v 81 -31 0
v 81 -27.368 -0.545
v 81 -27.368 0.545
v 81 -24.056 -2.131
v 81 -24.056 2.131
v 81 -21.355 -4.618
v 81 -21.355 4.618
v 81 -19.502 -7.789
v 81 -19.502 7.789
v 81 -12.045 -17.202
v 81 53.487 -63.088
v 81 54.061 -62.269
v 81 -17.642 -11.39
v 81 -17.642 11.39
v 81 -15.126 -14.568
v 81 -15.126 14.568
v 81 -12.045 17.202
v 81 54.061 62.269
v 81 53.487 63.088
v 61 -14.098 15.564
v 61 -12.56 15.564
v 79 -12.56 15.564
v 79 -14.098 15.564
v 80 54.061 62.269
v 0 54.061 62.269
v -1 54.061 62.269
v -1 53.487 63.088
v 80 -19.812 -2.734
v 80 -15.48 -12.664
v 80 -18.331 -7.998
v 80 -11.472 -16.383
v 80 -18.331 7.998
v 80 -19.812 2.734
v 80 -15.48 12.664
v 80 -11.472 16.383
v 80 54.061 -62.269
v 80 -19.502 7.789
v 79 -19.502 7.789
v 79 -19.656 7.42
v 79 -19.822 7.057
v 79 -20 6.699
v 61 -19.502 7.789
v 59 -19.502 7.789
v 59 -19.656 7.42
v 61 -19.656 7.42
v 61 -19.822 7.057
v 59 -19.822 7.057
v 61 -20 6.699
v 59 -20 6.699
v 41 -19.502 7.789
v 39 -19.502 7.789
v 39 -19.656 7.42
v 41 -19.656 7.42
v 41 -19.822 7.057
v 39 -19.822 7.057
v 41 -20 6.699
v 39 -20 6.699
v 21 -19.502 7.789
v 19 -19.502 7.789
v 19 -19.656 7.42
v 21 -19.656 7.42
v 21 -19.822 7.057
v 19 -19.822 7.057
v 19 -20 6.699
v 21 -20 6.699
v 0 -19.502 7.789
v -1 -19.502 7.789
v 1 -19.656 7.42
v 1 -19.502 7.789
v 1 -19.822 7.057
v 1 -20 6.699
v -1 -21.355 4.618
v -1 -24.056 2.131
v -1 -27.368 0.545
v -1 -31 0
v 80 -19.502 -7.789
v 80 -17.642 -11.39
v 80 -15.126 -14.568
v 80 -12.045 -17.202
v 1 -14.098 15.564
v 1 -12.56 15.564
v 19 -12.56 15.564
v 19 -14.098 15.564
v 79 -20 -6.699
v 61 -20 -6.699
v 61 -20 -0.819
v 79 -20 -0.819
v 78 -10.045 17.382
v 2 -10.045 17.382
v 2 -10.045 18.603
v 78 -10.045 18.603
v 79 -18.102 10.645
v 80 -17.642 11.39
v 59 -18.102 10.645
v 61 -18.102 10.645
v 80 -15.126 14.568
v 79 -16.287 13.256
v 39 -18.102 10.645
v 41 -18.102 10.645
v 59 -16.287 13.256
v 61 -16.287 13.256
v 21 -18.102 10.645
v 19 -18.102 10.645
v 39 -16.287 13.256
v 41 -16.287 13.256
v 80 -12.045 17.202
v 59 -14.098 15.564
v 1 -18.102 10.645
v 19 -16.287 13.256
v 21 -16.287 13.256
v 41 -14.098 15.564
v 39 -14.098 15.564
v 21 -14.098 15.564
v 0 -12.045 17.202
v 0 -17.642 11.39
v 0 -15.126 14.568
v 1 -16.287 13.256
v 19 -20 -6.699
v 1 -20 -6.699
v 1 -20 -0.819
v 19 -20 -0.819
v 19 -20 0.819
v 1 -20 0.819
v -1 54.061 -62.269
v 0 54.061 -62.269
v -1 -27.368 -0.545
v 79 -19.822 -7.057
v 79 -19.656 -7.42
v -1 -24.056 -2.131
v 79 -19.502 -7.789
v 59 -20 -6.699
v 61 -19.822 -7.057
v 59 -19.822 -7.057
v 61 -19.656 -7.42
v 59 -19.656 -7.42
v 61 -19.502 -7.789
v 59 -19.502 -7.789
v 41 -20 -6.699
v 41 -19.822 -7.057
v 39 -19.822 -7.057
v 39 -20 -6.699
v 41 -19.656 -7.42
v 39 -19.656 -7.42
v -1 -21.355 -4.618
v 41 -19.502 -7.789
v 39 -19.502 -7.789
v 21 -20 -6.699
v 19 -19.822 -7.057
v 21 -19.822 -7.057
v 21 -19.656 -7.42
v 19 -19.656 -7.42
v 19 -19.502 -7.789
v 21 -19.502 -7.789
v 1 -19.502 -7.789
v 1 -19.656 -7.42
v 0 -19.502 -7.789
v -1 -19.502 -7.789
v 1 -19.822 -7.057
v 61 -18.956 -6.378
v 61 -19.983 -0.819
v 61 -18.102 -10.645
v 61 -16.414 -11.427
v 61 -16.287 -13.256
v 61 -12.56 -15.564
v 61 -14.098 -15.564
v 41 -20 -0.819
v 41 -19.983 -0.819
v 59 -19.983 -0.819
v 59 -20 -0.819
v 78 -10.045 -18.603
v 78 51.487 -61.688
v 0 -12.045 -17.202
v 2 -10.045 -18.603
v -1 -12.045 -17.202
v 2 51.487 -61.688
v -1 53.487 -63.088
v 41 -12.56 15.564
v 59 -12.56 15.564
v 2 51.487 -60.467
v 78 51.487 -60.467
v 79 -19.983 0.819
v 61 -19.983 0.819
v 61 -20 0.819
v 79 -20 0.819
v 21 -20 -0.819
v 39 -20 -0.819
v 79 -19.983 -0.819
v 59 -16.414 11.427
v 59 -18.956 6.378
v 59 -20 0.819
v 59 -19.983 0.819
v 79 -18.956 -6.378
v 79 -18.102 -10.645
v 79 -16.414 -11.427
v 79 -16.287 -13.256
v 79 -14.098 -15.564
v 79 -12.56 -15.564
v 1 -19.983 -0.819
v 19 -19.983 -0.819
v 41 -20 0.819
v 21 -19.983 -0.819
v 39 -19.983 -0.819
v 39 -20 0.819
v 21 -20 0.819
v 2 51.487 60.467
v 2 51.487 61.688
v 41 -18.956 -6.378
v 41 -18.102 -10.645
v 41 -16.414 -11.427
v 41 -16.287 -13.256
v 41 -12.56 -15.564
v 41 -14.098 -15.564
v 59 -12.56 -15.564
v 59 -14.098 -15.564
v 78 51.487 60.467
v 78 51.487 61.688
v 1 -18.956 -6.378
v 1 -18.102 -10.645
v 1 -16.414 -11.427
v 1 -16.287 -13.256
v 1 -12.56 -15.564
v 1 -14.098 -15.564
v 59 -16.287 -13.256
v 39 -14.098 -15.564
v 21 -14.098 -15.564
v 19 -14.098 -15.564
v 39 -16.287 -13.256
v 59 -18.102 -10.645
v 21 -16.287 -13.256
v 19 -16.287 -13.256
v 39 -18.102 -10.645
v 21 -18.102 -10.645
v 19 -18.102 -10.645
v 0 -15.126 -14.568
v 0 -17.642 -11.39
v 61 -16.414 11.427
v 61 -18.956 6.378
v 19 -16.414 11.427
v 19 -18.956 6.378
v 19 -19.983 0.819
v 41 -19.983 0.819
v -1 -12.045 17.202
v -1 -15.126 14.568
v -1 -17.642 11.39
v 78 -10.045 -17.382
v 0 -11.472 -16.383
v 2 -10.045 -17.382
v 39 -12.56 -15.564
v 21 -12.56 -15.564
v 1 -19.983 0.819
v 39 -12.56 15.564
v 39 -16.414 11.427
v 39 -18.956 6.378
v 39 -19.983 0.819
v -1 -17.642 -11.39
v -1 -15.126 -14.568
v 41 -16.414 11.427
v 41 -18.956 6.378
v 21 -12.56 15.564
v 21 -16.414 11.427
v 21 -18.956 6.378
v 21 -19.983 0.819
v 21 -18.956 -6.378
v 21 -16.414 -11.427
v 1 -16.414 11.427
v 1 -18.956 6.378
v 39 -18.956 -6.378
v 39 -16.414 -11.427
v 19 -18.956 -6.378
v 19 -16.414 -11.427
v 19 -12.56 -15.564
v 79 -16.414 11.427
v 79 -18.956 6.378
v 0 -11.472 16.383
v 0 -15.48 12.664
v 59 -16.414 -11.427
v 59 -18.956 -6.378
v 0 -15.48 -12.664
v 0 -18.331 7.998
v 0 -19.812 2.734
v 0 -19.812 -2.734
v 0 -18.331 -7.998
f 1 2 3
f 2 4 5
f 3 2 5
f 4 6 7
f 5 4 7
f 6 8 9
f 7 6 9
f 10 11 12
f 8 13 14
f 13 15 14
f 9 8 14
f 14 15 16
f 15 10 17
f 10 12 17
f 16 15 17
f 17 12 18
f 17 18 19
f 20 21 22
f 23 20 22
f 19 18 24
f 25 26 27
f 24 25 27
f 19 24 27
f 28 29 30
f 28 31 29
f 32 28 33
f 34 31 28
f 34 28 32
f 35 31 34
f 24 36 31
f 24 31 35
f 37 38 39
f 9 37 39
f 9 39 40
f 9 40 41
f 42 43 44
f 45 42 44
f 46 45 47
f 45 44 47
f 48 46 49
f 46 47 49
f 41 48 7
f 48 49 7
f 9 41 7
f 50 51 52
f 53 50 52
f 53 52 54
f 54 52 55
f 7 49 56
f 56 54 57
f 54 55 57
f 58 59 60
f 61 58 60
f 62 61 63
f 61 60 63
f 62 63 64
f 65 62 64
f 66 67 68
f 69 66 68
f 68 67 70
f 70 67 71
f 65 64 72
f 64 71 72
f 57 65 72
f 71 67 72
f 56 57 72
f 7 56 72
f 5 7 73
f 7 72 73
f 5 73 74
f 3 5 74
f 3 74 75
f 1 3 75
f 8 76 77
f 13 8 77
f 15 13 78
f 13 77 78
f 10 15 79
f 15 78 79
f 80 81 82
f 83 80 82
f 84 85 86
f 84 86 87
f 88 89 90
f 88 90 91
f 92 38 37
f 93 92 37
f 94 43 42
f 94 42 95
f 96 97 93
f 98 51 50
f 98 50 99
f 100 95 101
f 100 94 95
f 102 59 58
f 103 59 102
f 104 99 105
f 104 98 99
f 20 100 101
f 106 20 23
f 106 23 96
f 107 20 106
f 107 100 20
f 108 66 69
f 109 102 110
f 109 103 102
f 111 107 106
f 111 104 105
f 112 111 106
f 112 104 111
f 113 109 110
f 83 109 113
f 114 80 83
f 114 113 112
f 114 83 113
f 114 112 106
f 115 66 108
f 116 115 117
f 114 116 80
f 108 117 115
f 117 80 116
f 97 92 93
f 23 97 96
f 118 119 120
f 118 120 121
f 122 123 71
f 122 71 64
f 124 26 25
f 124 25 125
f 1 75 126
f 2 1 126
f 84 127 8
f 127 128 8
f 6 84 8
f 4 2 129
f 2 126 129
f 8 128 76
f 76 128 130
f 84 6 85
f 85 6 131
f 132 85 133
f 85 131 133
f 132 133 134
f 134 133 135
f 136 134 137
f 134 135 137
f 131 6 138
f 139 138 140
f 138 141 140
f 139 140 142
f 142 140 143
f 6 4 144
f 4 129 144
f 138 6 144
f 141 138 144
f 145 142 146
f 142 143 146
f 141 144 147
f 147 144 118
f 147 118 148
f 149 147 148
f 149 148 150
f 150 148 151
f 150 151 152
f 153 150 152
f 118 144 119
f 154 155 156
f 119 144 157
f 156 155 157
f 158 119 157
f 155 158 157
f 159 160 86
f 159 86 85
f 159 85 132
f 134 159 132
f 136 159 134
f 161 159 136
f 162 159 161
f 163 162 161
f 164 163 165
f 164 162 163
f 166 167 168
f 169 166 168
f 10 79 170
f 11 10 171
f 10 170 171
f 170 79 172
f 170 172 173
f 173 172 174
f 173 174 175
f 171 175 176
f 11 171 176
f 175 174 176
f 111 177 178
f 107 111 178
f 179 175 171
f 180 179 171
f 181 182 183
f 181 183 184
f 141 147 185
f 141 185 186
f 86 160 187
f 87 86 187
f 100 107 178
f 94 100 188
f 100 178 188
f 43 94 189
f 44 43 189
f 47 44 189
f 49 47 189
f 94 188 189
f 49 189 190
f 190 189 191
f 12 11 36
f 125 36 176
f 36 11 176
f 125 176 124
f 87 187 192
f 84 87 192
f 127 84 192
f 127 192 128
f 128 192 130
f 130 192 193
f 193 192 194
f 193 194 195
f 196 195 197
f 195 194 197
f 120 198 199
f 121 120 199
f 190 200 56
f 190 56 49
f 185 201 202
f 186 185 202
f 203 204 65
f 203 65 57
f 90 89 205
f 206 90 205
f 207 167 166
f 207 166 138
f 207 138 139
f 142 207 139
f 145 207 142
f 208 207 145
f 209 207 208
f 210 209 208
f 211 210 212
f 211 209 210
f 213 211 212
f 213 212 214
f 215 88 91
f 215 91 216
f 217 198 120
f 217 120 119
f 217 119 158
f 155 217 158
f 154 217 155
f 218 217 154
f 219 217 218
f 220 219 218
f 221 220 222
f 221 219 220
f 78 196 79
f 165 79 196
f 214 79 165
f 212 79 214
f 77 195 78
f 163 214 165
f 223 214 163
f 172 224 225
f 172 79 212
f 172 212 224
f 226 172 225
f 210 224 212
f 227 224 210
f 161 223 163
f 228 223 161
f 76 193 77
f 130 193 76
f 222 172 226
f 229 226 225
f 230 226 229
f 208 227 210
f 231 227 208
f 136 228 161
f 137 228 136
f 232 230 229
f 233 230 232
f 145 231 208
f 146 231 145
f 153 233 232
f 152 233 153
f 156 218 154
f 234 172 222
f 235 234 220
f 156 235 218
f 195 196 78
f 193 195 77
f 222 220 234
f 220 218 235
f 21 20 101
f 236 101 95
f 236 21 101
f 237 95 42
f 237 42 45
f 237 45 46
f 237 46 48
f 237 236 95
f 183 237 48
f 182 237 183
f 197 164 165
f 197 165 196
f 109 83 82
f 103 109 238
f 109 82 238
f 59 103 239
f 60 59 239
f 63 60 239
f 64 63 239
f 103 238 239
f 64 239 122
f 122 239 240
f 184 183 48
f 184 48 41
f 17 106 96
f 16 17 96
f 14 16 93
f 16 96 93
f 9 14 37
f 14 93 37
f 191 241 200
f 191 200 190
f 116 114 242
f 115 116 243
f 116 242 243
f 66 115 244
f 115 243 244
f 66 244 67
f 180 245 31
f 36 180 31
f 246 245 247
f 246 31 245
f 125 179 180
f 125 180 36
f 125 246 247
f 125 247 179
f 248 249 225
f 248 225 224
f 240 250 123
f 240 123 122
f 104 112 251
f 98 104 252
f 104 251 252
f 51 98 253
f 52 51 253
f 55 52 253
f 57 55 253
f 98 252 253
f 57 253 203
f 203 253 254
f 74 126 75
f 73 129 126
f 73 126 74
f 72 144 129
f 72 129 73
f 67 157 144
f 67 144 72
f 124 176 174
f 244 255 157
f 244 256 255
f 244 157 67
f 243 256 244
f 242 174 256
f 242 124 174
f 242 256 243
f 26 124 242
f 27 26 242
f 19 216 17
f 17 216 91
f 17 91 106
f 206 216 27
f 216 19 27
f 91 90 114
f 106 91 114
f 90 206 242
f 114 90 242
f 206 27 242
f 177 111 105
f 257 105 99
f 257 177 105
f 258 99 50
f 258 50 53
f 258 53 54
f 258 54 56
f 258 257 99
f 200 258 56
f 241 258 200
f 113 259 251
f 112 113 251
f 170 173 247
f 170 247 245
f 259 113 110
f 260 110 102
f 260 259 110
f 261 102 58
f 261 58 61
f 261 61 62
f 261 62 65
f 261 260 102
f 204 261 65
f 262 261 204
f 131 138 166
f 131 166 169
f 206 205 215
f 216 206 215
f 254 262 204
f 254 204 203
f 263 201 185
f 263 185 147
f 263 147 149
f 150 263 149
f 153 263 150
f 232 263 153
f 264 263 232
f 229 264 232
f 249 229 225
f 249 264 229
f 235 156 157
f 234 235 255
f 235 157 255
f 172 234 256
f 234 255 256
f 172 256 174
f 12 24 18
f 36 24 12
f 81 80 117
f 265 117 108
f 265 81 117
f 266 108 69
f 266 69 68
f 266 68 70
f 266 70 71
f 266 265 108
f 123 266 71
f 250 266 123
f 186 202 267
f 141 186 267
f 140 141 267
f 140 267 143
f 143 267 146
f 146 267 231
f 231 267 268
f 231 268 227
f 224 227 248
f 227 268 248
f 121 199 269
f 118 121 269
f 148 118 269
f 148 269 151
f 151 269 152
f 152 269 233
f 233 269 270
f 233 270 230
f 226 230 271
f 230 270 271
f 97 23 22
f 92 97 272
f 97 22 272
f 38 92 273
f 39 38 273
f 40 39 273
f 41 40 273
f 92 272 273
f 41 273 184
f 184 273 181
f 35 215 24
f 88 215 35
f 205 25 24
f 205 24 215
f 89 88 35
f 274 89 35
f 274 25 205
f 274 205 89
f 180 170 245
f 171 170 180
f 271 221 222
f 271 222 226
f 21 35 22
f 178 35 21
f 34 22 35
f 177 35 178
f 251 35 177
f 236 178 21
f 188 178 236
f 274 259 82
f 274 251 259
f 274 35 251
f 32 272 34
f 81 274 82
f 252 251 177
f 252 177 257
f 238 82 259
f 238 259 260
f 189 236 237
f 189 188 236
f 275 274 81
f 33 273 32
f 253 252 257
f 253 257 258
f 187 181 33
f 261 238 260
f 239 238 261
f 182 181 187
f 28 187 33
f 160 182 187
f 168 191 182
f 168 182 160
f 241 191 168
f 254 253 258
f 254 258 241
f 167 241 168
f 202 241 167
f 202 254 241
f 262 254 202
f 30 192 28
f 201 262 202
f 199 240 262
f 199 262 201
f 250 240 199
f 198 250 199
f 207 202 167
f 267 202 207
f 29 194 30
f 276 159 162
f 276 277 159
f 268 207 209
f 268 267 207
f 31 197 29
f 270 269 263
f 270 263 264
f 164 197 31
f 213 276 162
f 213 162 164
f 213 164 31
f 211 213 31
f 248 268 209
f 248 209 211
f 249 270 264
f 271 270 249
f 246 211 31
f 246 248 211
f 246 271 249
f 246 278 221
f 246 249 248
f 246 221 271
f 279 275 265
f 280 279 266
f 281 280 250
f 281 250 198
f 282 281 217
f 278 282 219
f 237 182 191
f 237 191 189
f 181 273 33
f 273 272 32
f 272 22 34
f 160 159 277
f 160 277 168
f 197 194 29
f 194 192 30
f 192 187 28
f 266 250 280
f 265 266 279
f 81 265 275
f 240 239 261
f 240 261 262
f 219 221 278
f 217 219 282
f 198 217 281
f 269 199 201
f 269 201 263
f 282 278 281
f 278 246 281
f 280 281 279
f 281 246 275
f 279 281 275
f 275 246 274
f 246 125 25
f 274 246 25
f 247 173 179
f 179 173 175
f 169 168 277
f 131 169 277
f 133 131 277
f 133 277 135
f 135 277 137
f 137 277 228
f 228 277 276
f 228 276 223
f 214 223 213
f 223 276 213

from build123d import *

# Parameters (mm, degrees)
BOSS_EXTRUDE1_DEPTH     = 80
CUT_EXTRUDE1_DEPTH      = 116.337274212
CUT_EXTRUDE1_DEPTH_BACK = 116.337274212
SKETCH2_W               = 76
SKETCH2_H               = 61.532163543
SKETCH3_W               = 18
SKETCH3_H               = 14.744736797
CUT_EXTRUDE2_DEPTH      = 20
BOSS_EXTRUDE2_DEPTH     = 1
BOSS_EXTRUDE3_START     = -81
BOSS_EXTRUDE3_DEPTH     = 1


with BuildPart() as part:
    # Sketch1 → Boss-Extrude1 (new body)
    with BuildSketch(Plane(origin=(0, 0, 0), x_dir=(0, 0, -1), z_dir=(1, 0, 0))):
        with BuildLine():
            Line((-17.20219293, -12.045105163), (-63.088307838, 53.48705838))
            Line((-63.088307838, 53.48705838), (-62.269155794, 54.060634816))
            Line((-62.269155794, 54.060634816), (-16.383040886, -11.471528727))
            ThreePointArc((-16.383040886, -11.471528727), (0, -20), (16.383040886, -11.471528727))
            Line((16.383040886, -11.471528727), (62.269155794, 54.060634816))
            Line((62.269155794, 54.060634816), (63.088307838, 53.48705838))
            Line((63.088307838, 53.48705838), (17.20219293, -12.045105163))
            ThreePointArc((17.20219293, -12.045105163), (0, -21), (-17.20219293, -12.045105163))
        make_face()
        with BuildLine():
            ThreePointArc((7.788873039, -19.5021398), (0, -21), (-7.788873039, -19.5021398))
            ThreePointArc((-7.788873039, -19.5021398), (-2.130530499, -24.056165822), (0, -31))
            ThreePointArc((0, -31), (2.130530499, -24.056165822), (7.788873039, -19.5021398))
        make_face()
    extrude(amount=BOSS_EXTRUDE1_DEPTH)

    # Sketch2 → Cut-Extrude1 (cut, two sides: drawn at the far end of the back side and taken through both)
    with BuildSketch(Plane.XY.offset(-CUT_EXTRUDE1_DEPTH_BACK)):
        with Locations((40, 20.720976608)):
            Rectangle(SKETCH2_W, SKETCH2_H)
    extrude(amount=CUT_EXTRUDE1_DEPTH + CUT_EXTRUDE1_DEPTH_BACK, mode=Mode.SUBTRACT)

    # Sketch3 → Cut-Extrude2 (cut)
    with BuildSketch(Plane(origin=(0, 0, 0), x_dir=(1, 0, 0), z_dir=(0, 1, 0))):
        with Locations((10, -8.191520442)):
            Rectangle(SKETCH3_W, SKETCH3_H)
        with Locations((10, 8.191520442)):
            Rectangle(SKETCH3_W, SKETCH3_H)
        with Locations((30, 8.191520442)):
            Rectangle(SKETCH3_W, SKETCH3_H)
        with Locations((30, -8.191520442)):
            Rectangle(SKETCH3_W, SKETCH3_H)
        with Locations((50, -8.191520442)):
            Rectangle(SKETCH3_W, SKETCH3_H)
        with Locations((50, 8.191520442)):
            Rectangle(SKETCH3_W, SKETCH3_H)
        with Locations((70, -8.191520442)):
            Rectangle(SKETCH3_W, SKETCH3_H)
        with Locations((70, 8.191520442)):
            Rectangle(SKETCH3_W, SKETCH3_H)
    extrude(amount=-CUT_EXTRUDE2_DEPTH, mode=Mode.SUBTRACT)

    # Sketch4 → Boss-Extrude2 (add)
    with BuildSketch(Plane(origin=(80, 0, 0), x_dir=(0, 0, -1), z_dir=(1, 0, 0))):
        with BuildLine():
            Line((-62.269155794, 54.060634816), (62.269155794, 54.060634816))
            Line((62.269155794, 54.060634816), (16.383040886, -11.471528727))
            ThreePointArc((16.383040886, -11.471528727), (0, -20), (-16.383040886, -11.471528727))
            Line((-16.383040886, -11.471528727), (-62.269155794, 54.060634816))
        make_face()
        with BuildLine():
            Line((-62.269155794, 54.060634816), (-63.088307838, 53.48705838))
            Line((-63.088307838, 53.48705838), (-17.20219293, -12.045105163))
            ThreePointArc((-17.20219293, -12.045105163), (-13.03994578, -16.460857026), (-7.788873039, -19.5021398))
            ThreePointArc((-7.788873039, -19.5021398), (-2.130530499, -24.056165822), (0, -31))
            ThreePointArc((0, -31), (2.130530499, -24.056165822), (7.788873039, -19.5021398))
            ThreePointArc((7.788873039, -19.5021398), (13.03994578, -16.460857026), (17.20219293, -12.045105163))
            Line((17.20219293, -12.045105163), (63.088307838, 53.48705838))
            Line((63.088307838, 53.48705838), (62.269155794, 54.060634816))
            Line((62.269155794, 54.060634816), (16.383040886, -11.471528727))
            ThreePointArc((16.383040886, -11.471528727), (0, -20), (-16.383040886, -11.471528727))
            Line((-16.383040886, -11.471528727), (-62.269155794, 54.060634816))
        make_face()
    extrude(amount=BOSS_EXTRUDE2_DEPTH)

    # Sketch4<3> → Boss-Extrude3 (add)
    with BuildSketch(Plane(origin=(80, 0, 0), x_dir=(0, 0, -1), z_dir=(1, 0, 0)).offset(BOSS_EXTRUDE3_START)):
        with BuildLine():
            Line((-62.269155794, 54.060634816), (62.269155794, 54.060634816))
            Line((62.269155794, 54.060634816), (16.383040886, -11.471528727))
            ThreePointArc((16.383040886, -11.471528727), (0, -20), (-16.383040886, -11.471528727))
            Line((-16.383040886, -11.471528727), (-62.269155794, 54.060634816))
        make_face()
        with BuildLine():
            Line((-62.269155794, 54.060634816), (-63.088307838, 53.48705838))
            Line((-63.088307838, 53.48705838), (-17.20219293, -12.045105163))
            ThreePointArc((-17.20219293, -12.045105163), (-13.03994578, -16.460857026), (-7.788873039, -19.5021398))
            ThreePointArc((-7.788873039, -19.5021398), (-2.130530499, -24.056165822), (0, -31))
            ThreePointArc((0, -31), (2.130530499, -24.056165822), (7.788873039, -19.5021398))
            ThreePointArc((7.788873039, -19.5021398), (13.03994578, -16.460857026), (17.20219293, -12.045105163))
            Line((17.20219293, -12.045105163), (63.088307838, 53.48705838))
            Line((63.088307838, 53.48705838), (62.269155794, 54.060634816))
            Line((62.269155794, 54.060634816), (16.383040886, -11.471528727))
            ThreePointArc((16.383040886, -11.471528727), (0, -20), (-16.383040886, -11.471528727))
            Line((-16.383040886, -11.471528727), (-62.269155794, 54.060634816))
        make_face()
    extrude(amount=BOSS_EXTRUDE3_DEPTH)


solid = part.part
